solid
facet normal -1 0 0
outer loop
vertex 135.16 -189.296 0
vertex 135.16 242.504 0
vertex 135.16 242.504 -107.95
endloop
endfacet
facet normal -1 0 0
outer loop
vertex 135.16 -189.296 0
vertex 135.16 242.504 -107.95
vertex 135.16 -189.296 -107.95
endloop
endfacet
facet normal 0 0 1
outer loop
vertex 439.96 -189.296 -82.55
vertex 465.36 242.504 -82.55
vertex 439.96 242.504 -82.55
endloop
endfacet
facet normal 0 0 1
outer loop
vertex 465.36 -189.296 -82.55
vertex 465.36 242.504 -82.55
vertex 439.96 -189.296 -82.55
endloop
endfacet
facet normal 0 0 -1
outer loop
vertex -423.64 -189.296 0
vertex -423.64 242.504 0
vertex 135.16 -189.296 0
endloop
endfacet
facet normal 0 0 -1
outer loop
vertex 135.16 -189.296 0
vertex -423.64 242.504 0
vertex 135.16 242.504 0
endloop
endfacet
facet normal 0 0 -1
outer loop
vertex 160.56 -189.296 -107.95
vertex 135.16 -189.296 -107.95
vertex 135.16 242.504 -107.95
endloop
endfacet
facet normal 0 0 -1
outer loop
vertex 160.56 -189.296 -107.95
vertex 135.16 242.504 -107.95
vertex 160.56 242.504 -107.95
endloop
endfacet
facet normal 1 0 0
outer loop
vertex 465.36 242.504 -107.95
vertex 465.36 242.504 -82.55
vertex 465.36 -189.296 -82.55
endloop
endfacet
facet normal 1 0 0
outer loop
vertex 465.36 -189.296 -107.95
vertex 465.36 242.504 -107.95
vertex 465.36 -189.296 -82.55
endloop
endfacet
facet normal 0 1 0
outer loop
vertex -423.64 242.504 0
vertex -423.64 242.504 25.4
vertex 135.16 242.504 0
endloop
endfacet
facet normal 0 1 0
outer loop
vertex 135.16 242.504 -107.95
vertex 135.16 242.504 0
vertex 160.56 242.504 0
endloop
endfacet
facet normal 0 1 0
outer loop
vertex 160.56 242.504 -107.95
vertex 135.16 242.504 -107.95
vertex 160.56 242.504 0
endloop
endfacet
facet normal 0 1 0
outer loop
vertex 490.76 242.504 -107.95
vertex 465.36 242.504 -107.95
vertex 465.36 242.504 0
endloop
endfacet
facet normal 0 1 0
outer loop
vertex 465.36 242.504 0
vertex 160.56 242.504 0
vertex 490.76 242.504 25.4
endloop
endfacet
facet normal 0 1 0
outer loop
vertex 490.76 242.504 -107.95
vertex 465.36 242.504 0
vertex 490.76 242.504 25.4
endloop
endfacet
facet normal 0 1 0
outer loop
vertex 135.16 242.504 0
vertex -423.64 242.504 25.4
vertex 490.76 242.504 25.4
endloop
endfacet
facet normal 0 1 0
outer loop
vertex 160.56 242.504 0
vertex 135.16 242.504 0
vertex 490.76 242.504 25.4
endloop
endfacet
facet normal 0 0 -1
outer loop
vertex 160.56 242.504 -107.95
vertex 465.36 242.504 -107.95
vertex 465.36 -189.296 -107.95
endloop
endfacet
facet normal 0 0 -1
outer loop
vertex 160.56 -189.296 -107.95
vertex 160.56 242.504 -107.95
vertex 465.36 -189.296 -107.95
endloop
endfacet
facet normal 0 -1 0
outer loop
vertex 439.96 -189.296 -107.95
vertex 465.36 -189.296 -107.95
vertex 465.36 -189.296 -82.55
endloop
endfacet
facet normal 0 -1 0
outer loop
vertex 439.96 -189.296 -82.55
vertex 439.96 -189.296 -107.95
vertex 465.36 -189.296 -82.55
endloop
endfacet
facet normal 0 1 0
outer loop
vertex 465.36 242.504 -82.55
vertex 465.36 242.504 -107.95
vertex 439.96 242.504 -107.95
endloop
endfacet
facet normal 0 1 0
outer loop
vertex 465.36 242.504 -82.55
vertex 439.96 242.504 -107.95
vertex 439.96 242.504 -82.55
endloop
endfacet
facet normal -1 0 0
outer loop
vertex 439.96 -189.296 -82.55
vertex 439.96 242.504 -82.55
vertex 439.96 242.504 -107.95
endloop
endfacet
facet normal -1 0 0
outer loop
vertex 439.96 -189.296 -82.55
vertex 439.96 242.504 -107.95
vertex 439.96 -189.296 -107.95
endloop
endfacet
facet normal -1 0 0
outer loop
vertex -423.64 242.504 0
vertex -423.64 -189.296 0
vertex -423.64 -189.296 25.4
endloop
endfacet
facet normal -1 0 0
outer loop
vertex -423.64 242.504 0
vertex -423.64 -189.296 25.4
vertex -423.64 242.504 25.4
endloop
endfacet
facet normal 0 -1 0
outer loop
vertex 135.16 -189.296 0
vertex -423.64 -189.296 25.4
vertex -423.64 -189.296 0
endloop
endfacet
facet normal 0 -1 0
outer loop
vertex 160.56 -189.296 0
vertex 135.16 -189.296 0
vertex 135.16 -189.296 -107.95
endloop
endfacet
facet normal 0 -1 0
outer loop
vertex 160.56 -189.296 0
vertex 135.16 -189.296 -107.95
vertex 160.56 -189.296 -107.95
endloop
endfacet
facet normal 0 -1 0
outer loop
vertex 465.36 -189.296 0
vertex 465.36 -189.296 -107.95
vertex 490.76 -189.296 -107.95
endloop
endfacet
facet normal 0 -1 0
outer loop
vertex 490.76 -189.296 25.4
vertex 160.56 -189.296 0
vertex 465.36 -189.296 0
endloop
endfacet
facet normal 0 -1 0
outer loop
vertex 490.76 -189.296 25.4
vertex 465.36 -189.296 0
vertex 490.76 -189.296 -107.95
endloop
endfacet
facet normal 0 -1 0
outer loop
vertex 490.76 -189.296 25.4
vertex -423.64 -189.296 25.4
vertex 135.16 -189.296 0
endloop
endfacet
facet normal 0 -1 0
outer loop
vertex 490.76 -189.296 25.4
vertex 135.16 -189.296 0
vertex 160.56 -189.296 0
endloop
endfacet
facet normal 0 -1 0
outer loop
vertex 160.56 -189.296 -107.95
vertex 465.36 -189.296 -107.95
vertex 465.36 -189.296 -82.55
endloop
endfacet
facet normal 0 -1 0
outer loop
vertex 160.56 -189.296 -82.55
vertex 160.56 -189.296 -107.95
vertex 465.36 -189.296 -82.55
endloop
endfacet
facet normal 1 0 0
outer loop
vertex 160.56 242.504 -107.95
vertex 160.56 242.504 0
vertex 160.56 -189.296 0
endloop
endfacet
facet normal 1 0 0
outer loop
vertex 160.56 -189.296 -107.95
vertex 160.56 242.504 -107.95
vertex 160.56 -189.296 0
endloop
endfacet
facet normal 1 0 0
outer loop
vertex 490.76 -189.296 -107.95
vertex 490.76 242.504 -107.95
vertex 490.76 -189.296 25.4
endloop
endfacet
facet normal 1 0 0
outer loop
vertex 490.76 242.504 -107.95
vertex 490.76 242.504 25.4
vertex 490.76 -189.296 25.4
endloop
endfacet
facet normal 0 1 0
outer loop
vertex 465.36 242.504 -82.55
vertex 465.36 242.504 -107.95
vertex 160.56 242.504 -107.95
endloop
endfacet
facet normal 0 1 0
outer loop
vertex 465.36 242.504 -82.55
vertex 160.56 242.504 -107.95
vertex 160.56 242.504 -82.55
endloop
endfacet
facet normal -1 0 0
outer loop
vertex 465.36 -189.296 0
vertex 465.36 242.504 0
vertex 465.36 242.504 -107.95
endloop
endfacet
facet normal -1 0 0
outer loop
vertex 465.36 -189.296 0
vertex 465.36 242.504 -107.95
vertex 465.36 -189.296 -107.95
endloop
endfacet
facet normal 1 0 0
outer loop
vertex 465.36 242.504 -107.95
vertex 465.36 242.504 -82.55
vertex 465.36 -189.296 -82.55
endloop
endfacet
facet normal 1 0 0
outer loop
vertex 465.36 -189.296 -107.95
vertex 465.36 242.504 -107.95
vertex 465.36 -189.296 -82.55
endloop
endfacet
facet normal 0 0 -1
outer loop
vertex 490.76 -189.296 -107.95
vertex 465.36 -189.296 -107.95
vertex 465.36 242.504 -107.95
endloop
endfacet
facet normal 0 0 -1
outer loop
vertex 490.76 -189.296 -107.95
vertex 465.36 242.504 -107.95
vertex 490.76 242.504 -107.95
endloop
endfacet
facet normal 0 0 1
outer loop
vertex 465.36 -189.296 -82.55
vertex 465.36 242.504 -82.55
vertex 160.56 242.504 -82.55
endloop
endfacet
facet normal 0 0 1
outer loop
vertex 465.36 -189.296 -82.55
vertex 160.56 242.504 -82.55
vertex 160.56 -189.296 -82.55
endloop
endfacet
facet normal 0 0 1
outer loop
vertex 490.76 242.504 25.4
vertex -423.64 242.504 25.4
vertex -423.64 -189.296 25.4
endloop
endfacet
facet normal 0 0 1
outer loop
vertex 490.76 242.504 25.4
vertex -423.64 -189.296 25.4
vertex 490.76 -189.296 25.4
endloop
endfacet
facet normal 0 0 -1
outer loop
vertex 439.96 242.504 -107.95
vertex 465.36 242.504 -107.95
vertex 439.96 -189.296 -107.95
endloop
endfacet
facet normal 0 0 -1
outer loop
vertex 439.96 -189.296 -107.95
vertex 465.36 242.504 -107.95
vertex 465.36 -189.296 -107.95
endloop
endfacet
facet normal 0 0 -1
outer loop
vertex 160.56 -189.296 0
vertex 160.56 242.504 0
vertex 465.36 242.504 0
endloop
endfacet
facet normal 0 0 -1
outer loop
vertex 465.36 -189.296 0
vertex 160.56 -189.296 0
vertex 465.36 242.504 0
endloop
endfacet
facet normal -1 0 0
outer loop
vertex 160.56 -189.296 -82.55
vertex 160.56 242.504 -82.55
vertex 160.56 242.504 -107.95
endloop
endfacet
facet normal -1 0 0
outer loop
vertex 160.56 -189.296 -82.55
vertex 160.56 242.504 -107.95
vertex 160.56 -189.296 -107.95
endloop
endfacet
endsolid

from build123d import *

# Parameters (mm, degrees)
F0_W     = 914.4
F0_H     = 431.8
F1_DEPTH = 25.4
F2_W     = 25.4
F2_H     = 431.8
F3_DEPTH = 107.95
F4_W     = 431.8
F4_H     = 25.4
F5_DEPTH = 25.4
F6_DEPTH = 304.8


with BuildPart() as f1:
    # F0 (on Top) → F1 (new body)
    with BuildSketch(Plane.XY):
        with Locations((33.560222, 26.604218)):
            Rectangle(F0_W, F0_H)
    extrude(amount=F1_DEPTH)

    # F2 (on face) → F3 (join)
    with BuildSketch(Plane(origin=(0, 0, 0), x_dir=(1, 0, 0), z_dir=(0, 0, -1))):
        with Locations((478.060222, -26.604218)):
            Rectangle(F2_W, F2_H)
        with Locations((147.860222, -26.604218)):
            Rectangle(F2_W, F2_H)
    extrude(amount=F3_DEPTH)


with BuildPart() as f5:
    # F4 (on face) → F5 (new body)
    with BuildSketch(Plane(origin=(465.360222, 0, 0), x_dir=(0, -1, 0), z_dir=(-1, 0, 0))):
        with Locations((-26.604218, -95.25)):
            Rectangle(F4_W, F4_H)
    extrude(amount=F5_DEPTH)


with BuildPart() as f6:
    # F4 (on face) → F6 (new body)
    with BuildSketch(Plane(origin=(465.360222, 0, 0), x_dir=(0, -1, 0), z_dir=(-1, 0, 0))):
        with Locations((-26.604218, -95.25)):
            Rectangle(F4_W, F4_H)
    extrude(amount=F6_DEPTH)


solid = Compound([f1.part, f5.part, f6.part])
